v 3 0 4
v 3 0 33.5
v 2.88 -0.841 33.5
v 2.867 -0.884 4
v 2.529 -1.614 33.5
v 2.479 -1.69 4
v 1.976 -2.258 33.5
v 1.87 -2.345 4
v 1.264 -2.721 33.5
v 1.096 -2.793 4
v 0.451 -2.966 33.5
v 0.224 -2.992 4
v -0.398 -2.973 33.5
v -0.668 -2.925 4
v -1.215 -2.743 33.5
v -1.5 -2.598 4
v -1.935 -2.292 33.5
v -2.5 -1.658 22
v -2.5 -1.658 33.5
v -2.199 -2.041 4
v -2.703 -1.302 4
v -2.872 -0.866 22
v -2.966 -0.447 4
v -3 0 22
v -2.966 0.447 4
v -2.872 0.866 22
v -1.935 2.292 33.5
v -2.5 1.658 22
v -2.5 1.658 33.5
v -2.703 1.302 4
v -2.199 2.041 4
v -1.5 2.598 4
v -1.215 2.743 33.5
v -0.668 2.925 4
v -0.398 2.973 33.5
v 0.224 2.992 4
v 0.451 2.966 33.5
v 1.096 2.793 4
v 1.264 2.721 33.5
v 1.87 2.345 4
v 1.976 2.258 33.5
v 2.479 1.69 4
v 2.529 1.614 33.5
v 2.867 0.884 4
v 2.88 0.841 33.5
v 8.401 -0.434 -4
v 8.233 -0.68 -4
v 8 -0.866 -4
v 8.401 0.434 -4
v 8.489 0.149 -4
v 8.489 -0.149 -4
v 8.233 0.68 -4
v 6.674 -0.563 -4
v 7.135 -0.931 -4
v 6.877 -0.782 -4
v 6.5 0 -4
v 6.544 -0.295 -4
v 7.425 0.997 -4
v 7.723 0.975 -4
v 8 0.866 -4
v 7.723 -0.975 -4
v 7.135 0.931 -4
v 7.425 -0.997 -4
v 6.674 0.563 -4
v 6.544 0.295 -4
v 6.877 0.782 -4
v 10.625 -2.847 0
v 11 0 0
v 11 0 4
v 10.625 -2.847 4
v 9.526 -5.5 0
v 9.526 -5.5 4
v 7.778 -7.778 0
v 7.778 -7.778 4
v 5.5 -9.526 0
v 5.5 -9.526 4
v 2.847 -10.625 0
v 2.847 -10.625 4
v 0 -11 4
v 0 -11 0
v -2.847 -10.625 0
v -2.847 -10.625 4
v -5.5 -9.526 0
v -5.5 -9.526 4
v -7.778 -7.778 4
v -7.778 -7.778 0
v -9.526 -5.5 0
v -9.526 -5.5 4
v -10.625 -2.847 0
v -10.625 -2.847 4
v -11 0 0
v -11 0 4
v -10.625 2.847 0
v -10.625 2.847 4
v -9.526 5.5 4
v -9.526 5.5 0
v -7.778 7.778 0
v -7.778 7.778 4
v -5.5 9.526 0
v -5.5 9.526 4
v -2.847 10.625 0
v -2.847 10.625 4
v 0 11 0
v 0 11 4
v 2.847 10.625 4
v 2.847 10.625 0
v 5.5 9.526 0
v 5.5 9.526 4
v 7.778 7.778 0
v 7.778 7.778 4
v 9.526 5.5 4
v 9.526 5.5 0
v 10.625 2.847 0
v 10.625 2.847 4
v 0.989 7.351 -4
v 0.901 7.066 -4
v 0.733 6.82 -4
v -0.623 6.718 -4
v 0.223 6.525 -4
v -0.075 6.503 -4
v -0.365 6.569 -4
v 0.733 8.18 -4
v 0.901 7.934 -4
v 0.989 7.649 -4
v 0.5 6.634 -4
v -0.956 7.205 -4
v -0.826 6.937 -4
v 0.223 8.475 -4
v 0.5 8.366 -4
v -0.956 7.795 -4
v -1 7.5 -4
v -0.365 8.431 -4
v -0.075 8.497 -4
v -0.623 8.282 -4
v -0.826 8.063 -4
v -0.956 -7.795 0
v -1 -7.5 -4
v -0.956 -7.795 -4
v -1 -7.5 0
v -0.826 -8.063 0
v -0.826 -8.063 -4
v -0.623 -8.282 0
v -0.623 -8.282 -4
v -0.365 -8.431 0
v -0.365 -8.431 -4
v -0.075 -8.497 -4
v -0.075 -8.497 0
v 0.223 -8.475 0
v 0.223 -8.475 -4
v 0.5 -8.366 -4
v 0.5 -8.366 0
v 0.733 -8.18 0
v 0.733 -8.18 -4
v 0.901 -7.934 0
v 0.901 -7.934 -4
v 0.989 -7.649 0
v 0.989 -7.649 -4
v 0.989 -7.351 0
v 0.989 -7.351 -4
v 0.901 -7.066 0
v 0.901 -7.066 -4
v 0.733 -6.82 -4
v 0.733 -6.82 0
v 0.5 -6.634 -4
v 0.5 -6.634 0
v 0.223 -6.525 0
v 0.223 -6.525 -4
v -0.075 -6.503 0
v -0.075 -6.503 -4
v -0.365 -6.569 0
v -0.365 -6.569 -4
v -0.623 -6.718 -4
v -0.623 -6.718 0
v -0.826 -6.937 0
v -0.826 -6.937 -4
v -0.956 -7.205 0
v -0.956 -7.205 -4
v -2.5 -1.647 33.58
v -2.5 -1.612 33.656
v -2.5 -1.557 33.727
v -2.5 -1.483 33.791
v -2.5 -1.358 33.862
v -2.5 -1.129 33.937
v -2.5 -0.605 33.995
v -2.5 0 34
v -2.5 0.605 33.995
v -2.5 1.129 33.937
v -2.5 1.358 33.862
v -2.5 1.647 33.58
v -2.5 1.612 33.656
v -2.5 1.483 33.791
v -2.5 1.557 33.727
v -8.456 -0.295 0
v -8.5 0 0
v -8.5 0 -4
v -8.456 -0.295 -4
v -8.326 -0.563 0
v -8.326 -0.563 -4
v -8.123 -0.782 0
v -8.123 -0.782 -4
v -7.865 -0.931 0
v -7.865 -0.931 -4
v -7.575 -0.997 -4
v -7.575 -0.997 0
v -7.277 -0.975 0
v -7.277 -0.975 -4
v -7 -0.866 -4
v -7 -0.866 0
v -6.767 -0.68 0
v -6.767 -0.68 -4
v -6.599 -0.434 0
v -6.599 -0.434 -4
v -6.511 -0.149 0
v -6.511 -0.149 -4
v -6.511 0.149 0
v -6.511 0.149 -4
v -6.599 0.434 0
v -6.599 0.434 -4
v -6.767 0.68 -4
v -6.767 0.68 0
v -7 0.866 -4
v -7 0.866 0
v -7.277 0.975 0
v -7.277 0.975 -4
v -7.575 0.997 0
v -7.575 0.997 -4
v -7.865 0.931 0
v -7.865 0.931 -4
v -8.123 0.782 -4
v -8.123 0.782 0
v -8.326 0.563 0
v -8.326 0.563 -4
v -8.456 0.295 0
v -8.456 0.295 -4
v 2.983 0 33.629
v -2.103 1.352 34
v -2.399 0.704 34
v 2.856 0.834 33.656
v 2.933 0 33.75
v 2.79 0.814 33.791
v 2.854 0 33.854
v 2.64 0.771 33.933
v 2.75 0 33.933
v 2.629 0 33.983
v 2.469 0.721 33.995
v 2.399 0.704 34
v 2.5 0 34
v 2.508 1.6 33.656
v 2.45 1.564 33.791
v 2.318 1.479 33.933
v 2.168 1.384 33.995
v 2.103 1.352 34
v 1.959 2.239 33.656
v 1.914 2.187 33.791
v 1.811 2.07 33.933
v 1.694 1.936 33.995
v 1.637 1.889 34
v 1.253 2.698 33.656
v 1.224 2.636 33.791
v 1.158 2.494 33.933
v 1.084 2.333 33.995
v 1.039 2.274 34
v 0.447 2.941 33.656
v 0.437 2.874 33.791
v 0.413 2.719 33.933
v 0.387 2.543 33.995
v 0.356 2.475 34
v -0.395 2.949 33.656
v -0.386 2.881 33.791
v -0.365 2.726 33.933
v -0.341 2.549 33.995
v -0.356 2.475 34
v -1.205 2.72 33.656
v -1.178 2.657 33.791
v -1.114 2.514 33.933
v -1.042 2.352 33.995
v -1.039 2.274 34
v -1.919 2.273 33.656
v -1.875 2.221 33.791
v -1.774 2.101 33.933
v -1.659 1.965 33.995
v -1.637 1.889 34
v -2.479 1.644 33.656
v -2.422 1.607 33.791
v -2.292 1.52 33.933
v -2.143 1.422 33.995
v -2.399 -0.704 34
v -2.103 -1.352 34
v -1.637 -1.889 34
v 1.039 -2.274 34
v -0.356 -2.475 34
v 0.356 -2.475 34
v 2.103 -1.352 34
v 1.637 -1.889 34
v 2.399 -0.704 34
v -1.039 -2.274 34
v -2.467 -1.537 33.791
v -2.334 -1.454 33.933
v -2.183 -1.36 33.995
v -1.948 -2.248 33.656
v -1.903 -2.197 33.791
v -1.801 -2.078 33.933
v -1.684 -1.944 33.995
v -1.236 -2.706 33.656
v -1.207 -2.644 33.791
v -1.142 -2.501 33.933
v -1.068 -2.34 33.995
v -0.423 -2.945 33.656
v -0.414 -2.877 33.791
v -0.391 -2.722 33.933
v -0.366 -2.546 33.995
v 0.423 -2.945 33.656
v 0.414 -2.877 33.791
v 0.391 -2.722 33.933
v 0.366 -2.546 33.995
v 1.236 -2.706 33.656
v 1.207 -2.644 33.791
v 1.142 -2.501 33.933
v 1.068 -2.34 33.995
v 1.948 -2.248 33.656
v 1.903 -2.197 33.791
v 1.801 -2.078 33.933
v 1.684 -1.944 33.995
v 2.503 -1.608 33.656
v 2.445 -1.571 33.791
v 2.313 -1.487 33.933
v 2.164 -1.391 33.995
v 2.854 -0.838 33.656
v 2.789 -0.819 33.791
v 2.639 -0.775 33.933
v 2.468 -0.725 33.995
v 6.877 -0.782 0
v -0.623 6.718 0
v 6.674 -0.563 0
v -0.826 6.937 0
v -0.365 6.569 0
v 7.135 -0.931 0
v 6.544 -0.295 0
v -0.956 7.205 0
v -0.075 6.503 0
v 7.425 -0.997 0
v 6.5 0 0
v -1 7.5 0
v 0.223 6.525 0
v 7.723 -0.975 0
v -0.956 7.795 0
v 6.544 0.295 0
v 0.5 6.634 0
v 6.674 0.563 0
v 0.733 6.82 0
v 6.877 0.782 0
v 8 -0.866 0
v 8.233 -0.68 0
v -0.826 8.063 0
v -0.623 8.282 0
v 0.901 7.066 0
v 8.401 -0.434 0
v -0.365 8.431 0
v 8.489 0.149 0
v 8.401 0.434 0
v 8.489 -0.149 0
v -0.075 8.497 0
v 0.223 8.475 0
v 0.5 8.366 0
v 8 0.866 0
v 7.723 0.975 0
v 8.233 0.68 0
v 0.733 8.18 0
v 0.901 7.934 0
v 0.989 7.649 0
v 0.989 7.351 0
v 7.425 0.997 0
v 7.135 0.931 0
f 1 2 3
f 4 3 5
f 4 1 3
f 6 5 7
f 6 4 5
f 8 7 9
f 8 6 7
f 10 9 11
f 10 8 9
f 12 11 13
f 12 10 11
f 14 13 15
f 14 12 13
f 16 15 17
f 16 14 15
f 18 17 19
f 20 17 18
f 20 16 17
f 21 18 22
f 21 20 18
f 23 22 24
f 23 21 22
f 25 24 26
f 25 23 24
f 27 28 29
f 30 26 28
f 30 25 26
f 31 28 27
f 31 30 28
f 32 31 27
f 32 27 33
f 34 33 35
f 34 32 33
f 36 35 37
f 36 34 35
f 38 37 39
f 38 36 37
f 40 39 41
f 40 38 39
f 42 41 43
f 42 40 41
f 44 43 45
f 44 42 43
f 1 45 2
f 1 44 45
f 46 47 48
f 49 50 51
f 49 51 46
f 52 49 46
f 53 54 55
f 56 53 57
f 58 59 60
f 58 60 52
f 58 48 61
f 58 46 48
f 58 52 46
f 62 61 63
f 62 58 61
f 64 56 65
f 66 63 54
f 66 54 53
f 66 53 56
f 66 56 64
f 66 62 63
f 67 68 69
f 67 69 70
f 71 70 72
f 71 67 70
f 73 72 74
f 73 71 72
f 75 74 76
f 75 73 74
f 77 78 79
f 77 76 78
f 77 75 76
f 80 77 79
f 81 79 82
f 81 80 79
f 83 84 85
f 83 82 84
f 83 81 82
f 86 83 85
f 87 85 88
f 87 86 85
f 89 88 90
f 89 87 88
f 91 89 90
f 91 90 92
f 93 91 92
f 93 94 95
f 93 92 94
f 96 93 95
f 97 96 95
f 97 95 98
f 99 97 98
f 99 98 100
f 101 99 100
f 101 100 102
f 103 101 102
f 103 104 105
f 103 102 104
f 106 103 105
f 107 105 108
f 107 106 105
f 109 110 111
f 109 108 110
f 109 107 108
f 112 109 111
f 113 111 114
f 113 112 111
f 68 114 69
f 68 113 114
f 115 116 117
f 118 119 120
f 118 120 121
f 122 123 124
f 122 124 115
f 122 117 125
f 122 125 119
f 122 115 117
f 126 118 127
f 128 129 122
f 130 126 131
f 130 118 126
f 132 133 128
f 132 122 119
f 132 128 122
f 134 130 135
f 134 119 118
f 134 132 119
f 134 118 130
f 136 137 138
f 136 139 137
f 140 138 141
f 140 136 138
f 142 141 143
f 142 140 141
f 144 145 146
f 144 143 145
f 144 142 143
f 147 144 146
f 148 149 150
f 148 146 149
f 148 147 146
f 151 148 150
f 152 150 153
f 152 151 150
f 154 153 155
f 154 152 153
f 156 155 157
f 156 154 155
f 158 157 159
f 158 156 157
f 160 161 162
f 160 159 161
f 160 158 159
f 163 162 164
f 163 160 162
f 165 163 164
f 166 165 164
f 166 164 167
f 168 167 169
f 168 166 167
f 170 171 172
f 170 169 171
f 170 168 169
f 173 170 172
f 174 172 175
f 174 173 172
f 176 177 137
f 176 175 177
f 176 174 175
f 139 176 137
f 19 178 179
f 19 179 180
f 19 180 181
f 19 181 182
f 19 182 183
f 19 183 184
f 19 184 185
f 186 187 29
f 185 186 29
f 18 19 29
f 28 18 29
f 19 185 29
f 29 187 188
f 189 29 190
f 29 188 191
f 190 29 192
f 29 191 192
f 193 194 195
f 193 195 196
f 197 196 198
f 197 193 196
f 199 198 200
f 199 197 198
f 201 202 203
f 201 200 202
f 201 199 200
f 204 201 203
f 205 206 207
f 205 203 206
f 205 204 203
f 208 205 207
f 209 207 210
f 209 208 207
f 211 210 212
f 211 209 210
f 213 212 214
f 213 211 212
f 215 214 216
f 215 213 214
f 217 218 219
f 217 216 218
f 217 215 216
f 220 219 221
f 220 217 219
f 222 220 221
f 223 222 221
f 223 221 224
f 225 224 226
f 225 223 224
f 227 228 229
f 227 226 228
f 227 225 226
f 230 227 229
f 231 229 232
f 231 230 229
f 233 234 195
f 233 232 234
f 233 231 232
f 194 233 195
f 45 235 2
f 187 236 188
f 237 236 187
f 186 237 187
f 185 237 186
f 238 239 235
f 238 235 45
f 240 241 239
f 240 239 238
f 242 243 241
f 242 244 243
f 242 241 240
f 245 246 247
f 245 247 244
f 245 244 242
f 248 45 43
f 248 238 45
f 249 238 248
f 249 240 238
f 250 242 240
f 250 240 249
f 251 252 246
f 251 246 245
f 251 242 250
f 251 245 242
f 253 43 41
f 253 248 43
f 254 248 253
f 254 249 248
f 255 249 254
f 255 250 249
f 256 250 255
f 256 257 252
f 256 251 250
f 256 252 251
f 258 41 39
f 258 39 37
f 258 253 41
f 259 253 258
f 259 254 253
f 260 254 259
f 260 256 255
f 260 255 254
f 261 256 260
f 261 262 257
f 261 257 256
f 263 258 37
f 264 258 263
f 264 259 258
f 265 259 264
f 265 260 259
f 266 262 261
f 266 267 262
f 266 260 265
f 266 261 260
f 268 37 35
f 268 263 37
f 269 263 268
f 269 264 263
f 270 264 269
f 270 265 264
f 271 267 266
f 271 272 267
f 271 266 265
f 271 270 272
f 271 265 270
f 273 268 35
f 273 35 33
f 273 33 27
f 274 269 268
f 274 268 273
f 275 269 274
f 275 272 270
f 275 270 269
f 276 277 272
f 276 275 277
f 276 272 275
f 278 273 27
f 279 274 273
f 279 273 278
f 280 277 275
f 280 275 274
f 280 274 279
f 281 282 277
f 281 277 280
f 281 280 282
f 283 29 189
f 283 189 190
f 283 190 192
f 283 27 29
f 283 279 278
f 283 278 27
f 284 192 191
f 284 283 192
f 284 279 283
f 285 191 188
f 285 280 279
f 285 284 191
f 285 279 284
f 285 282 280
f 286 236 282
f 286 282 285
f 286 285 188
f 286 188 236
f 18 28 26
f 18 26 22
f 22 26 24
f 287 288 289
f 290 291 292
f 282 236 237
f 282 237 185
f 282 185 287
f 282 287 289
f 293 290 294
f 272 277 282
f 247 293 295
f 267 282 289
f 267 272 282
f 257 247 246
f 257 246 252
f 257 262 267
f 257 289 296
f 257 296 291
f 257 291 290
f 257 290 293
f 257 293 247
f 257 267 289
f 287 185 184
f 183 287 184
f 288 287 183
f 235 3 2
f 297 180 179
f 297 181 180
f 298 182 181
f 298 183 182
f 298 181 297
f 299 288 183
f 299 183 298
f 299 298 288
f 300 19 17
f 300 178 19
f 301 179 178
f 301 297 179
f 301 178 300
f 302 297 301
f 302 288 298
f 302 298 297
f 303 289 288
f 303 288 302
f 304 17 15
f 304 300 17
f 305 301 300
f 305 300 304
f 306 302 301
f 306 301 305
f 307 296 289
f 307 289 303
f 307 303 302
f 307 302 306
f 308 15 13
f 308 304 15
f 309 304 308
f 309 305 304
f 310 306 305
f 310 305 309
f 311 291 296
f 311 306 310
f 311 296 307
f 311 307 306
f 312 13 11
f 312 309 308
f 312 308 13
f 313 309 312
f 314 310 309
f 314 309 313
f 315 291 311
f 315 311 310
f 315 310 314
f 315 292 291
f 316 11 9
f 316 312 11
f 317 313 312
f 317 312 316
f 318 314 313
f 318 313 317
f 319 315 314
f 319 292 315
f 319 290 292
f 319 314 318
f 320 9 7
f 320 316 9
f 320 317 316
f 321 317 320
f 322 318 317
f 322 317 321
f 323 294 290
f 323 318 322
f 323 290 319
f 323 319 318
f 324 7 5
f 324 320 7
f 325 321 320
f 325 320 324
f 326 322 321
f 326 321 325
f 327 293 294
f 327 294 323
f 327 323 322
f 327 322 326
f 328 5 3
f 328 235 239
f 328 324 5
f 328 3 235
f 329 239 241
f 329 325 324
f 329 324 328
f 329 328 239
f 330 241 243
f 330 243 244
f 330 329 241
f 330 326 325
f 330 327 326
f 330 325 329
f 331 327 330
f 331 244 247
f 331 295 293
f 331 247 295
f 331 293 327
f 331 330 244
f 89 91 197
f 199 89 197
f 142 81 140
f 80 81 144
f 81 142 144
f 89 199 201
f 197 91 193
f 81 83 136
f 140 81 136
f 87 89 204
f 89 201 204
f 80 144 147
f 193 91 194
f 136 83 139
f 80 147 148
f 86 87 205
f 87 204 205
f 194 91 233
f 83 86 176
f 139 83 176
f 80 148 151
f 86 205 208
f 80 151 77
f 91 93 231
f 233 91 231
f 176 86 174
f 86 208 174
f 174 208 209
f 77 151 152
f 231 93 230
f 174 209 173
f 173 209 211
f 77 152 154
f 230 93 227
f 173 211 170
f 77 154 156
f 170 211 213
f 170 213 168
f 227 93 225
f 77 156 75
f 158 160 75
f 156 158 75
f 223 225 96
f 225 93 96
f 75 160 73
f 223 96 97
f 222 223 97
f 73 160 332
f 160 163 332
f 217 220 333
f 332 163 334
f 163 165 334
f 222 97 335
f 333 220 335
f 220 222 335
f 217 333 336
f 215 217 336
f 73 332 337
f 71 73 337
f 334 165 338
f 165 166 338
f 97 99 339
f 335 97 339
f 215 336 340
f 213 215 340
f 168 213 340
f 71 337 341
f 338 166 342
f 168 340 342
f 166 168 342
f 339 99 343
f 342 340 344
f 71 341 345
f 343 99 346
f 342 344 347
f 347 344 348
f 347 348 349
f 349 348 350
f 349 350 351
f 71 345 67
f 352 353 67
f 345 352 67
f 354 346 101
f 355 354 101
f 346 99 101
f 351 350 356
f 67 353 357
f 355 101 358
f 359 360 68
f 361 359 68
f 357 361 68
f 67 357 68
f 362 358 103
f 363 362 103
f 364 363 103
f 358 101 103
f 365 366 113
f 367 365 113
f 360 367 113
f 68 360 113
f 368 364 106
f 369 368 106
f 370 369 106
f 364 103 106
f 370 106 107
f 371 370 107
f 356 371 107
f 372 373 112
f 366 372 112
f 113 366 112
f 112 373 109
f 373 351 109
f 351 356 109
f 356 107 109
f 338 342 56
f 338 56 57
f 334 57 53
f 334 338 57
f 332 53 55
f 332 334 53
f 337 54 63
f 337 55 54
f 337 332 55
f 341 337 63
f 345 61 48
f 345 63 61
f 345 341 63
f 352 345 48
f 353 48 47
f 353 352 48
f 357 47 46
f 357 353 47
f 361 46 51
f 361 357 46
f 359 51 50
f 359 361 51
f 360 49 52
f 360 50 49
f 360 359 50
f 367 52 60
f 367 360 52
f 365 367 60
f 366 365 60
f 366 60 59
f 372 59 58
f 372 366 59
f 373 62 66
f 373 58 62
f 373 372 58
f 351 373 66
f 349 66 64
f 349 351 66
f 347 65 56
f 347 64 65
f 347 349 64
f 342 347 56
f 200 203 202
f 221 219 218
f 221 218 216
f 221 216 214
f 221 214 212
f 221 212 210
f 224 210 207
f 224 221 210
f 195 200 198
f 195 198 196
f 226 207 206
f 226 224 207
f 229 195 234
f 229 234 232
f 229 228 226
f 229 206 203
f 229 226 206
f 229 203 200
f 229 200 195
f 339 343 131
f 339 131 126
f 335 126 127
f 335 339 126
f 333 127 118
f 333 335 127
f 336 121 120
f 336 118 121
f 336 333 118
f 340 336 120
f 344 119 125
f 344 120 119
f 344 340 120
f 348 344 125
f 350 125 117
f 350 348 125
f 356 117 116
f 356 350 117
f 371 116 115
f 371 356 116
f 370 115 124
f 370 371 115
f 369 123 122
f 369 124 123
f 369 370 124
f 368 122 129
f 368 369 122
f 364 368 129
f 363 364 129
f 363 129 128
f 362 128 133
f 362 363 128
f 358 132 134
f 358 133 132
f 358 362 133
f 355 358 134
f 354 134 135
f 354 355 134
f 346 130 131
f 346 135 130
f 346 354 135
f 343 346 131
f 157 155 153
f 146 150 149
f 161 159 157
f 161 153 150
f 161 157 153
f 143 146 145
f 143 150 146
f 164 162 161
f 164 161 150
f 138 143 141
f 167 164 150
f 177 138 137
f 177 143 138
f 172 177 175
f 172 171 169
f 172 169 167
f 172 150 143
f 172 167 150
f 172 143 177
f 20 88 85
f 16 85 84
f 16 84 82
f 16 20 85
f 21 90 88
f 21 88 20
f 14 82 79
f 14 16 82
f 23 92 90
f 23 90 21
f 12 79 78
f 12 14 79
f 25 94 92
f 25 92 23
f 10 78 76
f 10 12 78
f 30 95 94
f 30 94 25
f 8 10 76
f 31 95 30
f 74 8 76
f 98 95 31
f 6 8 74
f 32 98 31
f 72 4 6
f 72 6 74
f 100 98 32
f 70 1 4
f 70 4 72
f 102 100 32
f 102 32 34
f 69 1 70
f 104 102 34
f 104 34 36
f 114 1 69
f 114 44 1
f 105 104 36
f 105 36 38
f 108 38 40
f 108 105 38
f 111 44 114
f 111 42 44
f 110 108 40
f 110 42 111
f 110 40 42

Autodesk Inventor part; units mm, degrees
ref_plane "YZ Plane" through (0, 0, 0) normal (1, 0, 0) x (0, 1, 0)
ref_plane "XZ Plane" through (0, 0, 0) normal (0, 1, 0) x (-1, 0, 0)
ref_plane "XY Plane" through (0, 0, 0) normal (0, 0, 1) x (1, 0, 0)
sketch "スケッチ1" plane through (0, 0, 0) normal (0, 0, 1) x (1, 0, 0)
  circle A0 centre (0, 0) radius 11
  dimension "d0" = 22
extrude "押し出し1" add sketch "スケッチ1" along normal blind 4
sketch "スケッチ2" plane through (0, 0, 4) normal (0, 0, 1) x (1, 0, 0)
  circle A0 centre (0, 0) radius 11 projected
  circle A1 centre (0, 0) radius 3
  dimension "d3" = 6
extrude "押し出し2" add sketch "スケッチ2" along normal blind 30 contours A1
sketch "スケッチ3" plane through (0, 0, 0) normal (0, 0, -1) x (-1, 0, 0)
  circle A0 centre (0, 7.5) radius 1
  circle A1 centre (-7.5, 0) radius 1
  circle A2 centre (0, -7.5) radius 1
  circle A3 centre (7.5, 0) radius 1
  point P0 (0, 0)
  dimension "d6" = 2
  dimension "d7" = 7.5
  dimension "d10" = 360
extrude "押し出し3" add sketch "スケッチ3" along normal blind 4
fillet "フィレット1" radius 0.5 1 edges at (-3, 0, 34)
sketch "スケッチ4" plane through (0, 0, 34) normal (0, 0, 1) x (1, 0, 0)
  line L0 (-3, -1.6583) -> (-2.5, -1.6583)
  line L1 (-2.5, -1.6583) -> (-2.5, 1.6583)
  line L2 (-2.5, 1.6583) -> (-3, 1.6583)
  line L3 (-3, 1.6583) -> (-3, -1.6583)
  circle A0 centre (0, 0) radius 3 projected
  point P0 (-2.5, 0)
  dimension "d15" = 0.5
extrude "押し出し4" cut sketch "スケッチ4" against normal blind 12 contours A0 L1 picked at (-2.5914, 0.3806)
properties part number "555_GearBox_Shaft" material "鉄、鋳鉄"
